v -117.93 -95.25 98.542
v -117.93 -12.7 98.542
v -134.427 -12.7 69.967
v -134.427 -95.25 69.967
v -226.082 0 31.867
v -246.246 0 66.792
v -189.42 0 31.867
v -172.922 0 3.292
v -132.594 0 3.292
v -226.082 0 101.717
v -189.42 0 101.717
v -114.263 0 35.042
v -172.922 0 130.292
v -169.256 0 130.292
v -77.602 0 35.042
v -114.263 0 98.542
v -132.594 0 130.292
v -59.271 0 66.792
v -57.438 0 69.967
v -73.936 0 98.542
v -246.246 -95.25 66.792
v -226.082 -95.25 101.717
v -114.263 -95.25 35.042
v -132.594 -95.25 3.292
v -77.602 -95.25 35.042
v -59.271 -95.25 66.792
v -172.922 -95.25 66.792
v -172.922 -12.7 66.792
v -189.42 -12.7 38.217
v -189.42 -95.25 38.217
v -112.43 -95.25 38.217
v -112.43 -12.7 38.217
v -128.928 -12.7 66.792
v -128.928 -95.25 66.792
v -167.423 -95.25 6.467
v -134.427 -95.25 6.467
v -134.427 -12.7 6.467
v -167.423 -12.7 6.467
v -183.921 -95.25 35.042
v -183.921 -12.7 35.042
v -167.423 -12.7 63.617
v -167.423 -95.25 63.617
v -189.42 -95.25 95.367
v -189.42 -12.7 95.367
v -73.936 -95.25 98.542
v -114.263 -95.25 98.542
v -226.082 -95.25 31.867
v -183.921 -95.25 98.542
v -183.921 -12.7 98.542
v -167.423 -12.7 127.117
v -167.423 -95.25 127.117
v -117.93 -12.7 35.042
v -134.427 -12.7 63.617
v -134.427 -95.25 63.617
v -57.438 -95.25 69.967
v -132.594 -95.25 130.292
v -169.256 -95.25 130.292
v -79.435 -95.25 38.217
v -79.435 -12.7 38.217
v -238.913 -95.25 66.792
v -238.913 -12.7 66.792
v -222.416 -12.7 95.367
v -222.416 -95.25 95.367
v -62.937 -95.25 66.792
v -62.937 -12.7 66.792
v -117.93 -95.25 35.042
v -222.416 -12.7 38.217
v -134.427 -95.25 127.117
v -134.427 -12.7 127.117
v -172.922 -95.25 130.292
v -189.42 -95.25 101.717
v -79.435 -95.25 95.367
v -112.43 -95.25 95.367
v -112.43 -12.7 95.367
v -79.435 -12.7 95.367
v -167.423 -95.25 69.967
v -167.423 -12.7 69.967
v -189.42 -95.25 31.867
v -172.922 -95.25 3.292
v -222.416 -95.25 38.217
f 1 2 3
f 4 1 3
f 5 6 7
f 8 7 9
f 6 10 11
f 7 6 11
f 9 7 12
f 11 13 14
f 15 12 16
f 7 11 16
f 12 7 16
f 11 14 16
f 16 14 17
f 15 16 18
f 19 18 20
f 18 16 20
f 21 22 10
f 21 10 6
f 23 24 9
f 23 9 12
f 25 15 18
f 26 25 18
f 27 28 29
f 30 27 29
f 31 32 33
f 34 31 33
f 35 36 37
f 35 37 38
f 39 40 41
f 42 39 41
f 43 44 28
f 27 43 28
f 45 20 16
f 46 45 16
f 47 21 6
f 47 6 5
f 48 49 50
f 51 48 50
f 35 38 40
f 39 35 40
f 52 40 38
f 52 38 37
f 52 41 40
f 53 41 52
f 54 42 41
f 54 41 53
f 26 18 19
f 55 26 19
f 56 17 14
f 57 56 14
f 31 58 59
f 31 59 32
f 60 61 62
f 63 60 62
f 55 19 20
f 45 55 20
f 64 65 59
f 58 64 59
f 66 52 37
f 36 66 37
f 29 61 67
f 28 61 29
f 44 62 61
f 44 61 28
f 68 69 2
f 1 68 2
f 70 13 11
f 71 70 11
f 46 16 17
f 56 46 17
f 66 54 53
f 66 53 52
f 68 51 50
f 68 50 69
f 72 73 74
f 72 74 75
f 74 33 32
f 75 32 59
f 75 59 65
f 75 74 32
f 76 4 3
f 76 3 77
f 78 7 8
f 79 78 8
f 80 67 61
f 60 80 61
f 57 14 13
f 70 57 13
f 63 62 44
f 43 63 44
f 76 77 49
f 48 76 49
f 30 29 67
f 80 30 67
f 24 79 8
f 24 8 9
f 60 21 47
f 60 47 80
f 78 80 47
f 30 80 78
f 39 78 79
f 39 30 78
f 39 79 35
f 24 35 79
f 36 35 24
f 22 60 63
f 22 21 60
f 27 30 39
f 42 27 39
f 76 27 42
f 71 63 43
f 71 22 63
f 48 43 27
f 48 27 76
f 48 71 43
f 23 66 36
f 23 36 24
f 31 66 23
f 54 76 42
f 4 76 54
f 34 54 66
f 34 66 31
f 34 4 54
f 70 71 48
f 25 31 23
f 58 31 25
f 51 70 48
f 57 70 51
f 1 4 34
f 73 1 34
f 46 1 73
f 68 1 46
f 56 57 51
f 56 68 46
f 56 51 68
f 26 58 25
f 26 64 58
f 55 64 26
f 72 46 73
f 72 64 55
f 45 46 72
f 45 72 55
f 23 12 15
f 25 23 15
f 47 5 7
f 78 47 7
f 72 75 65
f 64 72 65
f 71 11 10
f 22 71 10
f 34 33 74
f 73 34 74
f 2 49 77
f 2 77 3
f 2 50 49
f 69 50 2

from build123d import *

# Parameters (mm, degrees)
F1_DEPTH = 12.7
F2_DEPTH = 95.25


# Not quite as in the source:
# - a feature names something its author has since deleted; it is built from what else it names


with BuildPart() as f1:
    # F0 (on Front) → F1 (new body)
    with BuildSketch(Plane.XZ):
        Polygon((-132.5943648094, 3.2924993012), (-114.2634937626, 35.0424993012), (-132.5943648094, 66.7924993012), (-169.2561069029, 66.7924993012), (-187.5869779497, 35.0424993012), (-169.2561069029, 3.2924993012), align=None)
        Polygon((-167.4230197982, 6.4674993012), (-183.9208037403, 35.0424993012), (-167.4230197982, 63.6174993012), (-134.427451914, 63.6174993012), (-117.929667972, 35.0424993012), (-134.427451914, 6.4674993012), align=None, mode=Mode.SUBTRACT)
        Polygon((-114.2634937626, 35.0424993012), (-77.6017516691, 35.0424993012), (-59.2708806223, 66.7924993012), (-77.6017516691, 98.5424993012), (-114.2634937626, 98.5424993012), (-132.5943648094, 66.7924993012), align=None)
        Polygon((-112.4304066579, 38.2174993012), (-128.9281906, 66.7924993012), (-112.4304066579, 95.3674993012), (-79.4348387737, 95.3674993012), (-62.9370548316, 66.7924993012), (-79.4348387737, 38.2174993012), align=None, mode=Mode.SUBTRACT)
        Polygon((-169.2561069029, 66.7924993012), (-132.5943648094, 66.7924993012), (-114.2634937626, 98.5424993012), (-132.5943648094, 130.2924993012), (-169.2561069029, 130.2924993012), (-187.5869779497, 98.5424993012), align=None)
        Polygon((-167.4230197982, 69.9674993012), (-183.9208037403, 98.5424993012), (-167.4230197982, 127.1174993012), (-134.427451914, 127.1174993012), (-117.929667972, 98.5424993012), (-134.427451914, 69.9674993012), align=None, mode=Mode.SUBTRACT)
        Polygon((-187.5869779497, 35.0424993012), (-169.2561069029, 66.7924993012), (-187.5869779497, 98.5424993012), (-190.6410588775, 98.5424993012), (-224.2487200432, 98.5424993012), (-242.57959109, 66.7924993012), (-224.2487200432, 35.0424993012), (-221.8035396555, 35.0424993012), align=None)
        Polygon((-222.4156329385, 38.2174993012), (-238.9134168806, 66.7924993012), (-222.4156329385, 95.3674993012), (-189.4200650544, 95.3674993012), (-172.9222811123, 66.7924993012), (-189.4200650544, 38.2174993012), align=None, mode=Mode.SUBTRACT)
        Polygon((-222.4156329385, 95.3674993012), (-238.9134168806, 66.7924993012), (-222.4156329385, 38.2174993012), (-189.4200650544, 38.2174993012), (-172.9222811123, 66.7924993012), (-189.4200650544, 95.3674993012), align=None)
        Polygon((-167.4230197982, 127.1174993012), (-183.9208037403, 98.5424993012), (-167.4230197982, 69.9674993012), (-134.427451914, 69.9674993012), (-117.929667972, 98.5424993012), (-134.427451914, 127.1174993012), align=None)
        Polygon((-167.4230197982, 63.6174993012), (-183.9208037403, 35.0424993012), (-167.4230197982, 6.4674993012), (-134.427451914, 6.4674993012), (-117.929667972, 35.0424993012), (-134.427451914, 63.6174993012), align=None)
        Polygon((-112.4304066579, 95.3674993012), (-128.9281906, 66.7924993012), (-112.4304066579, 38.2174993012), (-79.4348387737, 38.2174993012), (-62.9370548316, 66.7924993012), (-79.4348387737, 95.3674993012), align=None)
    extrude(amount=F1_DEPTH)

    # F0 (on Front) → F2 (join)
    with BuildSketch(Plane.XZ):
        Polygon((-114.2634937626, 35.0424993012), (-77.6017516691, 35.0424993012), (-59.2708806223, 66.7924993012), (-77.6017516691, 98.5424993012), (-114.2634937626, 98.5424993012), (-132.5943648094, 66.7924993012), align=None)
        Polygon((-112.4304066579, 38.2174993012), (-128.9281906, 66.7924993012), (-112.4304066579, 95.3674993012), (-79.4348387737, 95.3674993012), (-62.9370548316, 66.7924993012), (-79.4348387737, 38.2174993012), align=None, mode=Mode.SUBTRACT)
        Polygon((-77.6017516691, 98.5424993012), (-59.2708806223, 66.7924993012), (-57.4377935176, 69.9674993012), (-73.9355774597, 98.5424993012), align=None)
        Polygon((-132.5943648094, 3.2924993012), (-114.2634937626, 35.0424993012), (-132.5943648094, 66.7924993012), (-169.2561069029, 66.7924993012), (-187.5869779497, 35.0424993012), (-169.2561069029, 3.2924993012), align=None)
        Polygon((-167.4230197982, 6.4674993012), (-183.9208037403, 35.0424993012), (-167.4230197982, 63.6174993012), (-134.427451914, 63.6174993012), (-117.929667972, 35.0424993012), (-134.427451914, 6.4674993012), align=None, mode=Mode.SUBTRACT)
        Polygon((-169.2561069029, 66.7924993012), (-132.5943648094, 66.7924993012), (-114.2634937626, 98.5424993012), (-132.5943648094, 130.2924993012), (-169.2561069029, 130.2924993012), (-187.5869779497, 98.5424993012), align=None)
        Polygon((-167.4230197982, 69.9674993012), (-183.9208037403, 98.5424993012), (-167.4230197982, 127.1174993012), (-134.427451914, 127.1174993012), (-117.929667972, 98.5424993012), (-134.427451914, 69.9674993012), align=None, mode=Mode.SUBTRACT)
        Polygon((-172.9222811123, 3.2924993012), (-169.2561069029, 3.2924993012), (-187.5869779497, 35.0424993012), (-221.8035396555, 35.0424993012), (-224.2487200432, 35.0424993012), (-242.57959109, 66.7924993012), (-224.2487200432, 98.5424993012), (-190.6410588775, 98.5424993012), (-187.5869779497, 98.5424993012), (-169.2561069029, 130.2924993012), (-172.9222811123, 130.2924993011), (-189.4200650544, 101.7174993012), (-226.0818071479, 101.7174993012), (-246.2457652993, 66.7924993012), (-226.0818071479, 31.8674993012), (-189.4200650544, 31.8674993012), align=None)
        Polygon((-187.5869779497, 35.0424993012), (-169.2561069029, 66.7924993012), (-187.5869779497, 98.5424993012), (-190.6410588775, 98.5424993012), (-224.2487200432, 98.5424993012), (-242.57959109, 66.7924993012), (-224.2487200432, 35.0424993012), (-221.8035396555, 35.0424993012), align=None)
        Polygon((-222.4156329385, 38.2174993012), (-238.9134168806, 66.7924993012), (-222.4156329385, 95.3674993012), (-189.4200650544, 95.3674993012), (-172.9222811123, 66.7924993012), (-189.4200650544, 38.2174993012), align=None, mode=Mode.SUBTRACT)
    extrude(amount=F2_DEPTH)


solid = f1.part
